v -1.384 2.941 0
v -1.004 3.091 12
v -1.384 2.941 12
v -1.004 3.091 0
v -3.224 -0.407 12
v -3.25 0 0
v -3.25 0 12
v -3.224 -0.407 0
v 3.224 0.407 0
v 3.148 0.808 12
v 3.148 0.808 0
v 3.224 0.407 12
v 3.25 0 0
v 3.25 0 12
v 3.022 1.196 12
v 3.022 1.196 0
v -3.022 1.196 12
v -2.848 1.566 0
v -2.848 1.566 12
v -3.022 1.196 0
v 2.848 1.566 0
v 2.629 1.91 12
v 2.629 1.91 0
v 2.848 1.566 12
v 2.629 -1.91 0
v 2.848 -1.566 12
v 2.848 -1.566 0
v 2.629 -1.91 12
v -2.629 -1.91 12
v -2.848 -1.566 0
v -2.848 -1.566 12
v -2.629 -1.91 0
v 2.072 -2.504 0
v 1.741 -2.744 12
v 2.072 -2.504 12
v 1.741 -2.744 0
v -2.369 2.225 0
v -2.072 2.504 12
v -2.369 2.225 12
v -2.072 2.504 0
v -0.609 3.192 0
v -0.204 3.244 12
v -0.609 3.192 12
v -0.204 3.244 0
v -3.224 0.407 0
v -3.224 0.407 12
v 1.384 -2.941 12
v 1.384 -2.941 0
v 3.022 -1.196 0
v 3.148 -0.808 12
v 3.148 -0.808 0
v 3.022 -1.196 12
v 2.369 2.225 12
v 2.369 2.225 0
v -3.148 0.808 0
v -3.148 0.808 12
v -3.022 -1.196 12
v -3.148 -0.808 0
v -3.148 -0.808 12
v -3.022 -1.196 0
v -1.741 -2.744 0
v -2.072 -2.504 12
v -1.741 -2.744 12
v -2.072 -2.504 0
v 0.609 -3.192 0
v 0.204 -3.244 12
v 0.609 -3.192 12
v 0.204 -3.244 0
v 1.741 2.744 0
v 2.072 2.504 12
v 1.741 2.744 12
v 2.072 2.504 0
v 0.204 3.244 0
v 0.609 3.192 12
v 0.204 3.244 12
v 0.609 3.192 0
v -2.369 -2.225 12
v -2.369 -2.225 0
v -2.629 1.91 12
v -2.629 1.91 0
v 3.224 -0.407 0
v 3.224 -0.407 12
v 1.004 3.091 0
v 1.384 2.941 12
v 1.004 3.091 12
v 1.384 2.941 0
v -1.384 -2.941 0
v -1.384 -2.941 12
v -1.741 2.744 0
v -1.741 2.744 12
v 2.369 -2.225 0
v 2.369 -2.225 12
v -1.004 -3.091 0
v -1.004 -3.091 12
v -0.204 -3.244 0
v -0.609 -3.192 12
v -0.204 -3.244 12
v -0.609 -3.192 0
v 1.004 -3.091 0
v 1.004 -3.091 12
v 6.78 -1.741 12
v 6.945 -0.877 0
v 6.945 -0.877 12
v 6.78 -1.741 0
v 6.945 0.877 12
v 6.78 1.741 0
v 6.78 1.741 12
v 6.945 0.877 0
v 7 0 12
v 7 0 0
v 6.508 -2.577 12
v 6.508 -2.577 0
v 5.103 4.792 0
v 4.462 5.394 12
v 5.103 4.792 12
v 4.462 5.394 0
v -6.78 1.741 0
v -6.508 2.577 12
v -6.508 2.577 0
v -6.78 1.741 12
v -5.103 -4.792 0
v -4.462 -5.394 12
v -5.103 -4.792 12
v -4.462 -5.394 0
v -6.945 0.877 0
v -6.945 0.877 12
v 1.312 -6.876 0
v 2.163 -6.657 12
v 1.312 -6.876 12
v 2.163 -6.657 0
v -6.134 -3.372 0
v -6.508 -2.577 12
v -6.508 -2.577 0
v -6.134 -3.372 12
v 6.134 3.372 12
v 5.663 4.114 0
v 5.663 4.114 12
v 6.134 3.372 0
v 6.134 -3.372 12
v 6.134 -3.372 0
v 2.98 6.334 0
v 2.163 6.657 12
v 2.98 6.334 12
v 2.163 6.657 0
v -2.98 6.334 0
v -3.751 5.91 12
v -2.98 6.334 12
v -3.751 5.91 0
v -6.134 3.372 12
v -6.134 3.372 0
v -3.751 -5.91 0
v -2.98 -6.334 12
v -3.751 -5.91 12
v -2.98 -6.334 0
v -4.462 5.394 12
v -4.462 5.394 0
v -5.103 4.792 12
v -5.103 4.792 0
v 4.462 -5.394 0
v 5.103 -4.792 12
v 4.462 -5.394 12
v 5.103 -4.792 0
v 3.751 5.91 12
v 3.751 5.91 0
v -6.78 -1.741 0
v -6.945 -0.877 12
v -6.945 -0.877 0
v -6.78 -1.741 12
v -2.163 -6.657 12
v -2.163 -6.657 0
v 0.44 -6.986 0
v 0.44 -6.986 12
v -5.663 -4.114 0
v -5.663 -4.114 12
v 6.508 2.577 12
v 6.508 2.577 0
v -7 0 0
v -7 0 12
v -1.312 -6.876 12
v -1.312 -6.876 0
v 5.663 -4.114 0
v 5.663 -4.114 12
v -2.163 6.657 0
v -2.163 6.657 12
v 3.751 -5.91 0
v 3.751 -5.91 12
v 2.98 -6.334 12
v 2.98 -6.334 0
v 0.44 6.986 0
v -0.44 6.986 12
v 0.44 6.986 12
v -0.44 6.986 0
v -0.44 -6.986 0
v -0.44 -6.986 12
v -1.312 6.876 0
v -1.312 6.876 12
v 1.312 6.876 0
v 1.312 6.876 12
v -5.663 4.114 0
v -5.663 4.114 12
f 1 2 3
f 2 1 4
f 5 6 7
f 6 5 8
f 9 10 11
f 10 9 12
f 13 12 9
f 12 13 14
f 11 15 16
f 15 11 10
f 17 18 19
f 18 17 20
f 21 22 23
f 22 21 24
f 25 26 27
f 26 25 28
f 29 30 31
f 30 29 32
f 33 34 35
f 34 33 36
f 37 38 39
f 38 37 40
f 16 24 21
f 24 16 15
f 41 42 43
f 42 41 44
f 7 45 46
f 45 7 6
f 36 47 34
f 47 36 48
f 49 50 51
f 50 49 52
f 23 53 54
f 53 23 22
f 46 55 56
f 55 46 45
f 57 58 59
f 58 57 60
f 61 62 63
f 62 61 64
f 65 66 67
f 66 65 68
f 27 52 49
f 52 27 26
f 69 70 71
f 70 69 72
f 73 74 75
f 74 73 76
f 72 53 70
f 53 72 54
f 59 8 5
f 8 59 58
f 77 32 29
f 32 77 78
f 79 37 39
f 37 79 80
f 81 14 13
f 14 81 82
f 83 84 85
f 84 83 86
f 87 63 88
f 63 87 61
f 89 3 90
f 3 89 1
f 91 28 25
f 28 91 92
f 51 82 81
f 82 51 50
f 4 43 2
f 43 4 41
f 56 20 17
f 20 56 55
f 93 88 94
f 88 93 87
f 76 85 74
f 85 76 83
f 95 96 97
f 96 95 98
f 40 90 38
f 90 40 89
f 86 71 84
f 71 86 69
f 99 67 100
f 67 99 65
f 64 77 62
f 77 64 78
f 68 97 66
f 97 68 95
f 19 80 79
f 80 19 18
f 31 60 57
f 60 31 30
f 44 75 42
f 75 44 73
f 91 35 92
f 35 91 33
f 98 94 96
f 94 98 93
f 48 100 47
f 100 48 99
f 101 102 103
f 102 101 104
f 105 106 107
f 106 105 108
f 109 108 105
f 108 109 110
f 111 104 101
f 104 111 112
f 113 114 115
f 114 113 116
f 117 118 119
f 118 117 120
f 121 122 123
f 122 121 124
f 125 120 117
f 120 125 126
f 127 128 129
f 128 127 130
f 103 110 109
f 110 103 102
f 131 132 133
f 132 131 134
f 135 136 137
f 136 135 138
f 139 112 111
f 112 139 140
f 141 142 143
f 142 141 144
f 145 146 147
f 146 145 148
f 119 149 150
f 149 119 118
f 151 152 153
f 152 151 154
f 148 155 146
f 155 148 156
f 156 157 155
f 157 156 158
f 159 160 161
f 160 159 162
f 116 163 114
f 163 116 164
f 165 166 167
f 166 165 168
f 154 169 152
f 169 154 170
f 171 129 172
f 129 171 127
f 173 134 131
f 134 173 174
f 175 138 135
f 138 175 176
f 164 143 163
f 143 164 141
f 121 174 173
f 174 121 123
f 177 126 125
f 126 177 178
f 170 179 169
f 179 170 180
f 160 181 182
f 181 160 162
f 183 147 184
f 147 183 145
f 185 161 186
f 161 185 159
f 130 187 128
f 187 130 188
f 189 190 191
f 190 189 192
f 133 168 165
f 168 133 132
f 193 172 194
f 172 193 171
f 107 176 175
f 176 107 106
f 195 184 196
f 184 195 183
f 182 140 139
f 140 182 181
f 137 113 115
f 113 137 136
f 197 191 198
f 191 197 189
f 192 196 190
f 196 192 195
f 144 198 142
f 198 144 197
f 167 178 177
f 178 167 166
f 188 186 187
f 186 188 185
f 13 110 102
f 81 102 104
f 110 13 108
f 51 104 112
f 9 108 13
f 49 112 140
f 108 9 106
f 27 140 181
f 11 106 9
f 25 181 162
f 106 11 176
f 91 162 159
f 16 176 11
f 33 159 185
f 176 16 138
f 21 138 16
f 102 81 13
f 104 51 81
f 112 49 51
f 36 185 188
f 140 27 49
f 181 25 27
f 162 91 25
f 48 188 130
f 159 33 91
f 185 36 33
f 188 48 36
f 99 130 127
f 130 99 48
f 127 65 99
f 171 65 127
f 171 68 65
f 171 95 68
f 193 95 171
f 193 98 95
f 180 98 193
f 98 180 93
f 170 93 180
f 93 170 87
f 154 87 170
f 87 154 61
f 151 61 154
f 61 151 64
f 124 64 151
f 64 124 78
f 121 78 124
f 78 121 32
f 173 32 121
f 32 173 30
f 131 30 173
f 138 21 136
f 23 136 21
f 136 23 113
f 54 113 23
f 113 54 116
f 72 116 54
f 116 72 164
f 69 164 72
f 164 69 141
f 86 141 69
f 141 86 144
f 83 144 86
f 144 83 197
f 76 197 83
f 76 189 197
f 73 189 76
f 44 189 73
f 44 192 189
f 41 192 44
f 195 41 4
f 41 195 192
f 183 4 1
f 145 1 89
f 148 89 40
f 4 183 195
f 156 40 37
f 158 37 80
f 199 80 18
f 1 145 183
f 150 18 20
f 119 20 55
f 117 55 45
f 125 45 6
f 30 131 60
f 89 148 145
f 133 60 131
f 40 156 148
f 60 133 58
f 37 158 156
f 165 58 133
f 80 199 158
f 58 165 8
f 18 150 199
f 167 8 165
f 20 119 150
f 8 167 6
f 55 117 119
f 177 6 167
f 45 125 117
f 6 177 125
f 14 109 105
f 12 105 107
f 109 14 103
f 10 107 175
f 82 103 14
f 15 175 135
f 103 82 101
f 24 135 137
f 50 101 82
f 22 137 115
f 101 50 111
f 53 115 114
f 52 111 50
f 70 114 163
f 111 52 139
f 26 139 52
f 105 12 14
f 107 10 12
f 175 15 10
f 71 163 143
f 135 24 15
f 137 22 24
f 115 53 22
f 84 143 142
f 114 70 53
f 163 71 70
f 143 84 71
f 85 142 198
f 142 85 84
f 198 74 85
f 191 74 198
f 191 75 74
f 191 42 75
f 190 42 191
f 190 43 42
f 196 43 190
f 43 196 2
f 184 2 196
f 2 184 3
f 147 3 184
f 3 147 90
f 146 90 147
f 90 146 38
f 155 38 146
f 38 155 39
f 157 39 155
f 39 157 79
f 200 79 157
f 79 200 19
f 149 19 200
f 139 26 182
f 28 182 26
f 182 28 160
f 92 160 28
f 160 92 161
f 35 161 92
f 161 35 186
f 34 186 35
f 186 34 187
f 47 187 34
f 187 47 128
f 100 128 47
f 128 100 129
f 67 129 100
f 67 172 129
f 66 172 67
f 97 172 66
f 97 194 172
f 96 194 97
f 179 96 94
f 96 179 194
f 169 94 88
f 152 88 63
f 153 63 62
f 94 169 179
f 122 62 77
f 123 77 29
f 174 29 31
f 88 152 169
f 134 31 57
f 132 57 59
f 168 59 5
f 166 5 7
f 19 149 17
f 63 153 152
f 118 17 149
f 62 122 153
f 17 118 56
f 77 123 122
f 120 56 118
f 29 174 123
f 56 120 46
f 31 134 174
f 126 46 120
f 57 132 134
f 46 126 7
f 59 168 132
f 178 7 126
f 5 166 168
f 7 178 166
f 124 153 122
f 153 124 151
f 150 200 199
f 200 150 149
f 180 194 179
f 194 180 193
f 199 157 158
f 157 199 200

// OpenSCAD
$fn = 50;


difference() {
	union() {
		*color(alpha = 1.0000000000, c = "gray") {
			translate(v = [0, 7, 0]) {
				linear_extrude(height = 1) {
					text(font = "Arial:style=Bold", halign = "center", size = 4.5000000000, text = "COMMENT plate main", valign = "center");
				}
			}
		}
		cylinder(h = 12, r = 7.0000000000);
	}
	union() {
		*color(alpha = 1.0000000000, c = "gray") {
			translate(v = [0, 7, 0]) {
				linear_extrude(height = 1) {
					text(font = "Arial:style=Bold", halign = "center", size = 4.5000000000, text = "COMMENT holes main", valign = "center");
				}
			}
		}
		translate(v = [0, 0, -100]) {
			cylinder(h = 200, r = 3.2500000000);
		}
		translate(v = [0, 0, -100]) {
			cylinder(h = 200, r = 1.8000000000);
		}
	}
}
